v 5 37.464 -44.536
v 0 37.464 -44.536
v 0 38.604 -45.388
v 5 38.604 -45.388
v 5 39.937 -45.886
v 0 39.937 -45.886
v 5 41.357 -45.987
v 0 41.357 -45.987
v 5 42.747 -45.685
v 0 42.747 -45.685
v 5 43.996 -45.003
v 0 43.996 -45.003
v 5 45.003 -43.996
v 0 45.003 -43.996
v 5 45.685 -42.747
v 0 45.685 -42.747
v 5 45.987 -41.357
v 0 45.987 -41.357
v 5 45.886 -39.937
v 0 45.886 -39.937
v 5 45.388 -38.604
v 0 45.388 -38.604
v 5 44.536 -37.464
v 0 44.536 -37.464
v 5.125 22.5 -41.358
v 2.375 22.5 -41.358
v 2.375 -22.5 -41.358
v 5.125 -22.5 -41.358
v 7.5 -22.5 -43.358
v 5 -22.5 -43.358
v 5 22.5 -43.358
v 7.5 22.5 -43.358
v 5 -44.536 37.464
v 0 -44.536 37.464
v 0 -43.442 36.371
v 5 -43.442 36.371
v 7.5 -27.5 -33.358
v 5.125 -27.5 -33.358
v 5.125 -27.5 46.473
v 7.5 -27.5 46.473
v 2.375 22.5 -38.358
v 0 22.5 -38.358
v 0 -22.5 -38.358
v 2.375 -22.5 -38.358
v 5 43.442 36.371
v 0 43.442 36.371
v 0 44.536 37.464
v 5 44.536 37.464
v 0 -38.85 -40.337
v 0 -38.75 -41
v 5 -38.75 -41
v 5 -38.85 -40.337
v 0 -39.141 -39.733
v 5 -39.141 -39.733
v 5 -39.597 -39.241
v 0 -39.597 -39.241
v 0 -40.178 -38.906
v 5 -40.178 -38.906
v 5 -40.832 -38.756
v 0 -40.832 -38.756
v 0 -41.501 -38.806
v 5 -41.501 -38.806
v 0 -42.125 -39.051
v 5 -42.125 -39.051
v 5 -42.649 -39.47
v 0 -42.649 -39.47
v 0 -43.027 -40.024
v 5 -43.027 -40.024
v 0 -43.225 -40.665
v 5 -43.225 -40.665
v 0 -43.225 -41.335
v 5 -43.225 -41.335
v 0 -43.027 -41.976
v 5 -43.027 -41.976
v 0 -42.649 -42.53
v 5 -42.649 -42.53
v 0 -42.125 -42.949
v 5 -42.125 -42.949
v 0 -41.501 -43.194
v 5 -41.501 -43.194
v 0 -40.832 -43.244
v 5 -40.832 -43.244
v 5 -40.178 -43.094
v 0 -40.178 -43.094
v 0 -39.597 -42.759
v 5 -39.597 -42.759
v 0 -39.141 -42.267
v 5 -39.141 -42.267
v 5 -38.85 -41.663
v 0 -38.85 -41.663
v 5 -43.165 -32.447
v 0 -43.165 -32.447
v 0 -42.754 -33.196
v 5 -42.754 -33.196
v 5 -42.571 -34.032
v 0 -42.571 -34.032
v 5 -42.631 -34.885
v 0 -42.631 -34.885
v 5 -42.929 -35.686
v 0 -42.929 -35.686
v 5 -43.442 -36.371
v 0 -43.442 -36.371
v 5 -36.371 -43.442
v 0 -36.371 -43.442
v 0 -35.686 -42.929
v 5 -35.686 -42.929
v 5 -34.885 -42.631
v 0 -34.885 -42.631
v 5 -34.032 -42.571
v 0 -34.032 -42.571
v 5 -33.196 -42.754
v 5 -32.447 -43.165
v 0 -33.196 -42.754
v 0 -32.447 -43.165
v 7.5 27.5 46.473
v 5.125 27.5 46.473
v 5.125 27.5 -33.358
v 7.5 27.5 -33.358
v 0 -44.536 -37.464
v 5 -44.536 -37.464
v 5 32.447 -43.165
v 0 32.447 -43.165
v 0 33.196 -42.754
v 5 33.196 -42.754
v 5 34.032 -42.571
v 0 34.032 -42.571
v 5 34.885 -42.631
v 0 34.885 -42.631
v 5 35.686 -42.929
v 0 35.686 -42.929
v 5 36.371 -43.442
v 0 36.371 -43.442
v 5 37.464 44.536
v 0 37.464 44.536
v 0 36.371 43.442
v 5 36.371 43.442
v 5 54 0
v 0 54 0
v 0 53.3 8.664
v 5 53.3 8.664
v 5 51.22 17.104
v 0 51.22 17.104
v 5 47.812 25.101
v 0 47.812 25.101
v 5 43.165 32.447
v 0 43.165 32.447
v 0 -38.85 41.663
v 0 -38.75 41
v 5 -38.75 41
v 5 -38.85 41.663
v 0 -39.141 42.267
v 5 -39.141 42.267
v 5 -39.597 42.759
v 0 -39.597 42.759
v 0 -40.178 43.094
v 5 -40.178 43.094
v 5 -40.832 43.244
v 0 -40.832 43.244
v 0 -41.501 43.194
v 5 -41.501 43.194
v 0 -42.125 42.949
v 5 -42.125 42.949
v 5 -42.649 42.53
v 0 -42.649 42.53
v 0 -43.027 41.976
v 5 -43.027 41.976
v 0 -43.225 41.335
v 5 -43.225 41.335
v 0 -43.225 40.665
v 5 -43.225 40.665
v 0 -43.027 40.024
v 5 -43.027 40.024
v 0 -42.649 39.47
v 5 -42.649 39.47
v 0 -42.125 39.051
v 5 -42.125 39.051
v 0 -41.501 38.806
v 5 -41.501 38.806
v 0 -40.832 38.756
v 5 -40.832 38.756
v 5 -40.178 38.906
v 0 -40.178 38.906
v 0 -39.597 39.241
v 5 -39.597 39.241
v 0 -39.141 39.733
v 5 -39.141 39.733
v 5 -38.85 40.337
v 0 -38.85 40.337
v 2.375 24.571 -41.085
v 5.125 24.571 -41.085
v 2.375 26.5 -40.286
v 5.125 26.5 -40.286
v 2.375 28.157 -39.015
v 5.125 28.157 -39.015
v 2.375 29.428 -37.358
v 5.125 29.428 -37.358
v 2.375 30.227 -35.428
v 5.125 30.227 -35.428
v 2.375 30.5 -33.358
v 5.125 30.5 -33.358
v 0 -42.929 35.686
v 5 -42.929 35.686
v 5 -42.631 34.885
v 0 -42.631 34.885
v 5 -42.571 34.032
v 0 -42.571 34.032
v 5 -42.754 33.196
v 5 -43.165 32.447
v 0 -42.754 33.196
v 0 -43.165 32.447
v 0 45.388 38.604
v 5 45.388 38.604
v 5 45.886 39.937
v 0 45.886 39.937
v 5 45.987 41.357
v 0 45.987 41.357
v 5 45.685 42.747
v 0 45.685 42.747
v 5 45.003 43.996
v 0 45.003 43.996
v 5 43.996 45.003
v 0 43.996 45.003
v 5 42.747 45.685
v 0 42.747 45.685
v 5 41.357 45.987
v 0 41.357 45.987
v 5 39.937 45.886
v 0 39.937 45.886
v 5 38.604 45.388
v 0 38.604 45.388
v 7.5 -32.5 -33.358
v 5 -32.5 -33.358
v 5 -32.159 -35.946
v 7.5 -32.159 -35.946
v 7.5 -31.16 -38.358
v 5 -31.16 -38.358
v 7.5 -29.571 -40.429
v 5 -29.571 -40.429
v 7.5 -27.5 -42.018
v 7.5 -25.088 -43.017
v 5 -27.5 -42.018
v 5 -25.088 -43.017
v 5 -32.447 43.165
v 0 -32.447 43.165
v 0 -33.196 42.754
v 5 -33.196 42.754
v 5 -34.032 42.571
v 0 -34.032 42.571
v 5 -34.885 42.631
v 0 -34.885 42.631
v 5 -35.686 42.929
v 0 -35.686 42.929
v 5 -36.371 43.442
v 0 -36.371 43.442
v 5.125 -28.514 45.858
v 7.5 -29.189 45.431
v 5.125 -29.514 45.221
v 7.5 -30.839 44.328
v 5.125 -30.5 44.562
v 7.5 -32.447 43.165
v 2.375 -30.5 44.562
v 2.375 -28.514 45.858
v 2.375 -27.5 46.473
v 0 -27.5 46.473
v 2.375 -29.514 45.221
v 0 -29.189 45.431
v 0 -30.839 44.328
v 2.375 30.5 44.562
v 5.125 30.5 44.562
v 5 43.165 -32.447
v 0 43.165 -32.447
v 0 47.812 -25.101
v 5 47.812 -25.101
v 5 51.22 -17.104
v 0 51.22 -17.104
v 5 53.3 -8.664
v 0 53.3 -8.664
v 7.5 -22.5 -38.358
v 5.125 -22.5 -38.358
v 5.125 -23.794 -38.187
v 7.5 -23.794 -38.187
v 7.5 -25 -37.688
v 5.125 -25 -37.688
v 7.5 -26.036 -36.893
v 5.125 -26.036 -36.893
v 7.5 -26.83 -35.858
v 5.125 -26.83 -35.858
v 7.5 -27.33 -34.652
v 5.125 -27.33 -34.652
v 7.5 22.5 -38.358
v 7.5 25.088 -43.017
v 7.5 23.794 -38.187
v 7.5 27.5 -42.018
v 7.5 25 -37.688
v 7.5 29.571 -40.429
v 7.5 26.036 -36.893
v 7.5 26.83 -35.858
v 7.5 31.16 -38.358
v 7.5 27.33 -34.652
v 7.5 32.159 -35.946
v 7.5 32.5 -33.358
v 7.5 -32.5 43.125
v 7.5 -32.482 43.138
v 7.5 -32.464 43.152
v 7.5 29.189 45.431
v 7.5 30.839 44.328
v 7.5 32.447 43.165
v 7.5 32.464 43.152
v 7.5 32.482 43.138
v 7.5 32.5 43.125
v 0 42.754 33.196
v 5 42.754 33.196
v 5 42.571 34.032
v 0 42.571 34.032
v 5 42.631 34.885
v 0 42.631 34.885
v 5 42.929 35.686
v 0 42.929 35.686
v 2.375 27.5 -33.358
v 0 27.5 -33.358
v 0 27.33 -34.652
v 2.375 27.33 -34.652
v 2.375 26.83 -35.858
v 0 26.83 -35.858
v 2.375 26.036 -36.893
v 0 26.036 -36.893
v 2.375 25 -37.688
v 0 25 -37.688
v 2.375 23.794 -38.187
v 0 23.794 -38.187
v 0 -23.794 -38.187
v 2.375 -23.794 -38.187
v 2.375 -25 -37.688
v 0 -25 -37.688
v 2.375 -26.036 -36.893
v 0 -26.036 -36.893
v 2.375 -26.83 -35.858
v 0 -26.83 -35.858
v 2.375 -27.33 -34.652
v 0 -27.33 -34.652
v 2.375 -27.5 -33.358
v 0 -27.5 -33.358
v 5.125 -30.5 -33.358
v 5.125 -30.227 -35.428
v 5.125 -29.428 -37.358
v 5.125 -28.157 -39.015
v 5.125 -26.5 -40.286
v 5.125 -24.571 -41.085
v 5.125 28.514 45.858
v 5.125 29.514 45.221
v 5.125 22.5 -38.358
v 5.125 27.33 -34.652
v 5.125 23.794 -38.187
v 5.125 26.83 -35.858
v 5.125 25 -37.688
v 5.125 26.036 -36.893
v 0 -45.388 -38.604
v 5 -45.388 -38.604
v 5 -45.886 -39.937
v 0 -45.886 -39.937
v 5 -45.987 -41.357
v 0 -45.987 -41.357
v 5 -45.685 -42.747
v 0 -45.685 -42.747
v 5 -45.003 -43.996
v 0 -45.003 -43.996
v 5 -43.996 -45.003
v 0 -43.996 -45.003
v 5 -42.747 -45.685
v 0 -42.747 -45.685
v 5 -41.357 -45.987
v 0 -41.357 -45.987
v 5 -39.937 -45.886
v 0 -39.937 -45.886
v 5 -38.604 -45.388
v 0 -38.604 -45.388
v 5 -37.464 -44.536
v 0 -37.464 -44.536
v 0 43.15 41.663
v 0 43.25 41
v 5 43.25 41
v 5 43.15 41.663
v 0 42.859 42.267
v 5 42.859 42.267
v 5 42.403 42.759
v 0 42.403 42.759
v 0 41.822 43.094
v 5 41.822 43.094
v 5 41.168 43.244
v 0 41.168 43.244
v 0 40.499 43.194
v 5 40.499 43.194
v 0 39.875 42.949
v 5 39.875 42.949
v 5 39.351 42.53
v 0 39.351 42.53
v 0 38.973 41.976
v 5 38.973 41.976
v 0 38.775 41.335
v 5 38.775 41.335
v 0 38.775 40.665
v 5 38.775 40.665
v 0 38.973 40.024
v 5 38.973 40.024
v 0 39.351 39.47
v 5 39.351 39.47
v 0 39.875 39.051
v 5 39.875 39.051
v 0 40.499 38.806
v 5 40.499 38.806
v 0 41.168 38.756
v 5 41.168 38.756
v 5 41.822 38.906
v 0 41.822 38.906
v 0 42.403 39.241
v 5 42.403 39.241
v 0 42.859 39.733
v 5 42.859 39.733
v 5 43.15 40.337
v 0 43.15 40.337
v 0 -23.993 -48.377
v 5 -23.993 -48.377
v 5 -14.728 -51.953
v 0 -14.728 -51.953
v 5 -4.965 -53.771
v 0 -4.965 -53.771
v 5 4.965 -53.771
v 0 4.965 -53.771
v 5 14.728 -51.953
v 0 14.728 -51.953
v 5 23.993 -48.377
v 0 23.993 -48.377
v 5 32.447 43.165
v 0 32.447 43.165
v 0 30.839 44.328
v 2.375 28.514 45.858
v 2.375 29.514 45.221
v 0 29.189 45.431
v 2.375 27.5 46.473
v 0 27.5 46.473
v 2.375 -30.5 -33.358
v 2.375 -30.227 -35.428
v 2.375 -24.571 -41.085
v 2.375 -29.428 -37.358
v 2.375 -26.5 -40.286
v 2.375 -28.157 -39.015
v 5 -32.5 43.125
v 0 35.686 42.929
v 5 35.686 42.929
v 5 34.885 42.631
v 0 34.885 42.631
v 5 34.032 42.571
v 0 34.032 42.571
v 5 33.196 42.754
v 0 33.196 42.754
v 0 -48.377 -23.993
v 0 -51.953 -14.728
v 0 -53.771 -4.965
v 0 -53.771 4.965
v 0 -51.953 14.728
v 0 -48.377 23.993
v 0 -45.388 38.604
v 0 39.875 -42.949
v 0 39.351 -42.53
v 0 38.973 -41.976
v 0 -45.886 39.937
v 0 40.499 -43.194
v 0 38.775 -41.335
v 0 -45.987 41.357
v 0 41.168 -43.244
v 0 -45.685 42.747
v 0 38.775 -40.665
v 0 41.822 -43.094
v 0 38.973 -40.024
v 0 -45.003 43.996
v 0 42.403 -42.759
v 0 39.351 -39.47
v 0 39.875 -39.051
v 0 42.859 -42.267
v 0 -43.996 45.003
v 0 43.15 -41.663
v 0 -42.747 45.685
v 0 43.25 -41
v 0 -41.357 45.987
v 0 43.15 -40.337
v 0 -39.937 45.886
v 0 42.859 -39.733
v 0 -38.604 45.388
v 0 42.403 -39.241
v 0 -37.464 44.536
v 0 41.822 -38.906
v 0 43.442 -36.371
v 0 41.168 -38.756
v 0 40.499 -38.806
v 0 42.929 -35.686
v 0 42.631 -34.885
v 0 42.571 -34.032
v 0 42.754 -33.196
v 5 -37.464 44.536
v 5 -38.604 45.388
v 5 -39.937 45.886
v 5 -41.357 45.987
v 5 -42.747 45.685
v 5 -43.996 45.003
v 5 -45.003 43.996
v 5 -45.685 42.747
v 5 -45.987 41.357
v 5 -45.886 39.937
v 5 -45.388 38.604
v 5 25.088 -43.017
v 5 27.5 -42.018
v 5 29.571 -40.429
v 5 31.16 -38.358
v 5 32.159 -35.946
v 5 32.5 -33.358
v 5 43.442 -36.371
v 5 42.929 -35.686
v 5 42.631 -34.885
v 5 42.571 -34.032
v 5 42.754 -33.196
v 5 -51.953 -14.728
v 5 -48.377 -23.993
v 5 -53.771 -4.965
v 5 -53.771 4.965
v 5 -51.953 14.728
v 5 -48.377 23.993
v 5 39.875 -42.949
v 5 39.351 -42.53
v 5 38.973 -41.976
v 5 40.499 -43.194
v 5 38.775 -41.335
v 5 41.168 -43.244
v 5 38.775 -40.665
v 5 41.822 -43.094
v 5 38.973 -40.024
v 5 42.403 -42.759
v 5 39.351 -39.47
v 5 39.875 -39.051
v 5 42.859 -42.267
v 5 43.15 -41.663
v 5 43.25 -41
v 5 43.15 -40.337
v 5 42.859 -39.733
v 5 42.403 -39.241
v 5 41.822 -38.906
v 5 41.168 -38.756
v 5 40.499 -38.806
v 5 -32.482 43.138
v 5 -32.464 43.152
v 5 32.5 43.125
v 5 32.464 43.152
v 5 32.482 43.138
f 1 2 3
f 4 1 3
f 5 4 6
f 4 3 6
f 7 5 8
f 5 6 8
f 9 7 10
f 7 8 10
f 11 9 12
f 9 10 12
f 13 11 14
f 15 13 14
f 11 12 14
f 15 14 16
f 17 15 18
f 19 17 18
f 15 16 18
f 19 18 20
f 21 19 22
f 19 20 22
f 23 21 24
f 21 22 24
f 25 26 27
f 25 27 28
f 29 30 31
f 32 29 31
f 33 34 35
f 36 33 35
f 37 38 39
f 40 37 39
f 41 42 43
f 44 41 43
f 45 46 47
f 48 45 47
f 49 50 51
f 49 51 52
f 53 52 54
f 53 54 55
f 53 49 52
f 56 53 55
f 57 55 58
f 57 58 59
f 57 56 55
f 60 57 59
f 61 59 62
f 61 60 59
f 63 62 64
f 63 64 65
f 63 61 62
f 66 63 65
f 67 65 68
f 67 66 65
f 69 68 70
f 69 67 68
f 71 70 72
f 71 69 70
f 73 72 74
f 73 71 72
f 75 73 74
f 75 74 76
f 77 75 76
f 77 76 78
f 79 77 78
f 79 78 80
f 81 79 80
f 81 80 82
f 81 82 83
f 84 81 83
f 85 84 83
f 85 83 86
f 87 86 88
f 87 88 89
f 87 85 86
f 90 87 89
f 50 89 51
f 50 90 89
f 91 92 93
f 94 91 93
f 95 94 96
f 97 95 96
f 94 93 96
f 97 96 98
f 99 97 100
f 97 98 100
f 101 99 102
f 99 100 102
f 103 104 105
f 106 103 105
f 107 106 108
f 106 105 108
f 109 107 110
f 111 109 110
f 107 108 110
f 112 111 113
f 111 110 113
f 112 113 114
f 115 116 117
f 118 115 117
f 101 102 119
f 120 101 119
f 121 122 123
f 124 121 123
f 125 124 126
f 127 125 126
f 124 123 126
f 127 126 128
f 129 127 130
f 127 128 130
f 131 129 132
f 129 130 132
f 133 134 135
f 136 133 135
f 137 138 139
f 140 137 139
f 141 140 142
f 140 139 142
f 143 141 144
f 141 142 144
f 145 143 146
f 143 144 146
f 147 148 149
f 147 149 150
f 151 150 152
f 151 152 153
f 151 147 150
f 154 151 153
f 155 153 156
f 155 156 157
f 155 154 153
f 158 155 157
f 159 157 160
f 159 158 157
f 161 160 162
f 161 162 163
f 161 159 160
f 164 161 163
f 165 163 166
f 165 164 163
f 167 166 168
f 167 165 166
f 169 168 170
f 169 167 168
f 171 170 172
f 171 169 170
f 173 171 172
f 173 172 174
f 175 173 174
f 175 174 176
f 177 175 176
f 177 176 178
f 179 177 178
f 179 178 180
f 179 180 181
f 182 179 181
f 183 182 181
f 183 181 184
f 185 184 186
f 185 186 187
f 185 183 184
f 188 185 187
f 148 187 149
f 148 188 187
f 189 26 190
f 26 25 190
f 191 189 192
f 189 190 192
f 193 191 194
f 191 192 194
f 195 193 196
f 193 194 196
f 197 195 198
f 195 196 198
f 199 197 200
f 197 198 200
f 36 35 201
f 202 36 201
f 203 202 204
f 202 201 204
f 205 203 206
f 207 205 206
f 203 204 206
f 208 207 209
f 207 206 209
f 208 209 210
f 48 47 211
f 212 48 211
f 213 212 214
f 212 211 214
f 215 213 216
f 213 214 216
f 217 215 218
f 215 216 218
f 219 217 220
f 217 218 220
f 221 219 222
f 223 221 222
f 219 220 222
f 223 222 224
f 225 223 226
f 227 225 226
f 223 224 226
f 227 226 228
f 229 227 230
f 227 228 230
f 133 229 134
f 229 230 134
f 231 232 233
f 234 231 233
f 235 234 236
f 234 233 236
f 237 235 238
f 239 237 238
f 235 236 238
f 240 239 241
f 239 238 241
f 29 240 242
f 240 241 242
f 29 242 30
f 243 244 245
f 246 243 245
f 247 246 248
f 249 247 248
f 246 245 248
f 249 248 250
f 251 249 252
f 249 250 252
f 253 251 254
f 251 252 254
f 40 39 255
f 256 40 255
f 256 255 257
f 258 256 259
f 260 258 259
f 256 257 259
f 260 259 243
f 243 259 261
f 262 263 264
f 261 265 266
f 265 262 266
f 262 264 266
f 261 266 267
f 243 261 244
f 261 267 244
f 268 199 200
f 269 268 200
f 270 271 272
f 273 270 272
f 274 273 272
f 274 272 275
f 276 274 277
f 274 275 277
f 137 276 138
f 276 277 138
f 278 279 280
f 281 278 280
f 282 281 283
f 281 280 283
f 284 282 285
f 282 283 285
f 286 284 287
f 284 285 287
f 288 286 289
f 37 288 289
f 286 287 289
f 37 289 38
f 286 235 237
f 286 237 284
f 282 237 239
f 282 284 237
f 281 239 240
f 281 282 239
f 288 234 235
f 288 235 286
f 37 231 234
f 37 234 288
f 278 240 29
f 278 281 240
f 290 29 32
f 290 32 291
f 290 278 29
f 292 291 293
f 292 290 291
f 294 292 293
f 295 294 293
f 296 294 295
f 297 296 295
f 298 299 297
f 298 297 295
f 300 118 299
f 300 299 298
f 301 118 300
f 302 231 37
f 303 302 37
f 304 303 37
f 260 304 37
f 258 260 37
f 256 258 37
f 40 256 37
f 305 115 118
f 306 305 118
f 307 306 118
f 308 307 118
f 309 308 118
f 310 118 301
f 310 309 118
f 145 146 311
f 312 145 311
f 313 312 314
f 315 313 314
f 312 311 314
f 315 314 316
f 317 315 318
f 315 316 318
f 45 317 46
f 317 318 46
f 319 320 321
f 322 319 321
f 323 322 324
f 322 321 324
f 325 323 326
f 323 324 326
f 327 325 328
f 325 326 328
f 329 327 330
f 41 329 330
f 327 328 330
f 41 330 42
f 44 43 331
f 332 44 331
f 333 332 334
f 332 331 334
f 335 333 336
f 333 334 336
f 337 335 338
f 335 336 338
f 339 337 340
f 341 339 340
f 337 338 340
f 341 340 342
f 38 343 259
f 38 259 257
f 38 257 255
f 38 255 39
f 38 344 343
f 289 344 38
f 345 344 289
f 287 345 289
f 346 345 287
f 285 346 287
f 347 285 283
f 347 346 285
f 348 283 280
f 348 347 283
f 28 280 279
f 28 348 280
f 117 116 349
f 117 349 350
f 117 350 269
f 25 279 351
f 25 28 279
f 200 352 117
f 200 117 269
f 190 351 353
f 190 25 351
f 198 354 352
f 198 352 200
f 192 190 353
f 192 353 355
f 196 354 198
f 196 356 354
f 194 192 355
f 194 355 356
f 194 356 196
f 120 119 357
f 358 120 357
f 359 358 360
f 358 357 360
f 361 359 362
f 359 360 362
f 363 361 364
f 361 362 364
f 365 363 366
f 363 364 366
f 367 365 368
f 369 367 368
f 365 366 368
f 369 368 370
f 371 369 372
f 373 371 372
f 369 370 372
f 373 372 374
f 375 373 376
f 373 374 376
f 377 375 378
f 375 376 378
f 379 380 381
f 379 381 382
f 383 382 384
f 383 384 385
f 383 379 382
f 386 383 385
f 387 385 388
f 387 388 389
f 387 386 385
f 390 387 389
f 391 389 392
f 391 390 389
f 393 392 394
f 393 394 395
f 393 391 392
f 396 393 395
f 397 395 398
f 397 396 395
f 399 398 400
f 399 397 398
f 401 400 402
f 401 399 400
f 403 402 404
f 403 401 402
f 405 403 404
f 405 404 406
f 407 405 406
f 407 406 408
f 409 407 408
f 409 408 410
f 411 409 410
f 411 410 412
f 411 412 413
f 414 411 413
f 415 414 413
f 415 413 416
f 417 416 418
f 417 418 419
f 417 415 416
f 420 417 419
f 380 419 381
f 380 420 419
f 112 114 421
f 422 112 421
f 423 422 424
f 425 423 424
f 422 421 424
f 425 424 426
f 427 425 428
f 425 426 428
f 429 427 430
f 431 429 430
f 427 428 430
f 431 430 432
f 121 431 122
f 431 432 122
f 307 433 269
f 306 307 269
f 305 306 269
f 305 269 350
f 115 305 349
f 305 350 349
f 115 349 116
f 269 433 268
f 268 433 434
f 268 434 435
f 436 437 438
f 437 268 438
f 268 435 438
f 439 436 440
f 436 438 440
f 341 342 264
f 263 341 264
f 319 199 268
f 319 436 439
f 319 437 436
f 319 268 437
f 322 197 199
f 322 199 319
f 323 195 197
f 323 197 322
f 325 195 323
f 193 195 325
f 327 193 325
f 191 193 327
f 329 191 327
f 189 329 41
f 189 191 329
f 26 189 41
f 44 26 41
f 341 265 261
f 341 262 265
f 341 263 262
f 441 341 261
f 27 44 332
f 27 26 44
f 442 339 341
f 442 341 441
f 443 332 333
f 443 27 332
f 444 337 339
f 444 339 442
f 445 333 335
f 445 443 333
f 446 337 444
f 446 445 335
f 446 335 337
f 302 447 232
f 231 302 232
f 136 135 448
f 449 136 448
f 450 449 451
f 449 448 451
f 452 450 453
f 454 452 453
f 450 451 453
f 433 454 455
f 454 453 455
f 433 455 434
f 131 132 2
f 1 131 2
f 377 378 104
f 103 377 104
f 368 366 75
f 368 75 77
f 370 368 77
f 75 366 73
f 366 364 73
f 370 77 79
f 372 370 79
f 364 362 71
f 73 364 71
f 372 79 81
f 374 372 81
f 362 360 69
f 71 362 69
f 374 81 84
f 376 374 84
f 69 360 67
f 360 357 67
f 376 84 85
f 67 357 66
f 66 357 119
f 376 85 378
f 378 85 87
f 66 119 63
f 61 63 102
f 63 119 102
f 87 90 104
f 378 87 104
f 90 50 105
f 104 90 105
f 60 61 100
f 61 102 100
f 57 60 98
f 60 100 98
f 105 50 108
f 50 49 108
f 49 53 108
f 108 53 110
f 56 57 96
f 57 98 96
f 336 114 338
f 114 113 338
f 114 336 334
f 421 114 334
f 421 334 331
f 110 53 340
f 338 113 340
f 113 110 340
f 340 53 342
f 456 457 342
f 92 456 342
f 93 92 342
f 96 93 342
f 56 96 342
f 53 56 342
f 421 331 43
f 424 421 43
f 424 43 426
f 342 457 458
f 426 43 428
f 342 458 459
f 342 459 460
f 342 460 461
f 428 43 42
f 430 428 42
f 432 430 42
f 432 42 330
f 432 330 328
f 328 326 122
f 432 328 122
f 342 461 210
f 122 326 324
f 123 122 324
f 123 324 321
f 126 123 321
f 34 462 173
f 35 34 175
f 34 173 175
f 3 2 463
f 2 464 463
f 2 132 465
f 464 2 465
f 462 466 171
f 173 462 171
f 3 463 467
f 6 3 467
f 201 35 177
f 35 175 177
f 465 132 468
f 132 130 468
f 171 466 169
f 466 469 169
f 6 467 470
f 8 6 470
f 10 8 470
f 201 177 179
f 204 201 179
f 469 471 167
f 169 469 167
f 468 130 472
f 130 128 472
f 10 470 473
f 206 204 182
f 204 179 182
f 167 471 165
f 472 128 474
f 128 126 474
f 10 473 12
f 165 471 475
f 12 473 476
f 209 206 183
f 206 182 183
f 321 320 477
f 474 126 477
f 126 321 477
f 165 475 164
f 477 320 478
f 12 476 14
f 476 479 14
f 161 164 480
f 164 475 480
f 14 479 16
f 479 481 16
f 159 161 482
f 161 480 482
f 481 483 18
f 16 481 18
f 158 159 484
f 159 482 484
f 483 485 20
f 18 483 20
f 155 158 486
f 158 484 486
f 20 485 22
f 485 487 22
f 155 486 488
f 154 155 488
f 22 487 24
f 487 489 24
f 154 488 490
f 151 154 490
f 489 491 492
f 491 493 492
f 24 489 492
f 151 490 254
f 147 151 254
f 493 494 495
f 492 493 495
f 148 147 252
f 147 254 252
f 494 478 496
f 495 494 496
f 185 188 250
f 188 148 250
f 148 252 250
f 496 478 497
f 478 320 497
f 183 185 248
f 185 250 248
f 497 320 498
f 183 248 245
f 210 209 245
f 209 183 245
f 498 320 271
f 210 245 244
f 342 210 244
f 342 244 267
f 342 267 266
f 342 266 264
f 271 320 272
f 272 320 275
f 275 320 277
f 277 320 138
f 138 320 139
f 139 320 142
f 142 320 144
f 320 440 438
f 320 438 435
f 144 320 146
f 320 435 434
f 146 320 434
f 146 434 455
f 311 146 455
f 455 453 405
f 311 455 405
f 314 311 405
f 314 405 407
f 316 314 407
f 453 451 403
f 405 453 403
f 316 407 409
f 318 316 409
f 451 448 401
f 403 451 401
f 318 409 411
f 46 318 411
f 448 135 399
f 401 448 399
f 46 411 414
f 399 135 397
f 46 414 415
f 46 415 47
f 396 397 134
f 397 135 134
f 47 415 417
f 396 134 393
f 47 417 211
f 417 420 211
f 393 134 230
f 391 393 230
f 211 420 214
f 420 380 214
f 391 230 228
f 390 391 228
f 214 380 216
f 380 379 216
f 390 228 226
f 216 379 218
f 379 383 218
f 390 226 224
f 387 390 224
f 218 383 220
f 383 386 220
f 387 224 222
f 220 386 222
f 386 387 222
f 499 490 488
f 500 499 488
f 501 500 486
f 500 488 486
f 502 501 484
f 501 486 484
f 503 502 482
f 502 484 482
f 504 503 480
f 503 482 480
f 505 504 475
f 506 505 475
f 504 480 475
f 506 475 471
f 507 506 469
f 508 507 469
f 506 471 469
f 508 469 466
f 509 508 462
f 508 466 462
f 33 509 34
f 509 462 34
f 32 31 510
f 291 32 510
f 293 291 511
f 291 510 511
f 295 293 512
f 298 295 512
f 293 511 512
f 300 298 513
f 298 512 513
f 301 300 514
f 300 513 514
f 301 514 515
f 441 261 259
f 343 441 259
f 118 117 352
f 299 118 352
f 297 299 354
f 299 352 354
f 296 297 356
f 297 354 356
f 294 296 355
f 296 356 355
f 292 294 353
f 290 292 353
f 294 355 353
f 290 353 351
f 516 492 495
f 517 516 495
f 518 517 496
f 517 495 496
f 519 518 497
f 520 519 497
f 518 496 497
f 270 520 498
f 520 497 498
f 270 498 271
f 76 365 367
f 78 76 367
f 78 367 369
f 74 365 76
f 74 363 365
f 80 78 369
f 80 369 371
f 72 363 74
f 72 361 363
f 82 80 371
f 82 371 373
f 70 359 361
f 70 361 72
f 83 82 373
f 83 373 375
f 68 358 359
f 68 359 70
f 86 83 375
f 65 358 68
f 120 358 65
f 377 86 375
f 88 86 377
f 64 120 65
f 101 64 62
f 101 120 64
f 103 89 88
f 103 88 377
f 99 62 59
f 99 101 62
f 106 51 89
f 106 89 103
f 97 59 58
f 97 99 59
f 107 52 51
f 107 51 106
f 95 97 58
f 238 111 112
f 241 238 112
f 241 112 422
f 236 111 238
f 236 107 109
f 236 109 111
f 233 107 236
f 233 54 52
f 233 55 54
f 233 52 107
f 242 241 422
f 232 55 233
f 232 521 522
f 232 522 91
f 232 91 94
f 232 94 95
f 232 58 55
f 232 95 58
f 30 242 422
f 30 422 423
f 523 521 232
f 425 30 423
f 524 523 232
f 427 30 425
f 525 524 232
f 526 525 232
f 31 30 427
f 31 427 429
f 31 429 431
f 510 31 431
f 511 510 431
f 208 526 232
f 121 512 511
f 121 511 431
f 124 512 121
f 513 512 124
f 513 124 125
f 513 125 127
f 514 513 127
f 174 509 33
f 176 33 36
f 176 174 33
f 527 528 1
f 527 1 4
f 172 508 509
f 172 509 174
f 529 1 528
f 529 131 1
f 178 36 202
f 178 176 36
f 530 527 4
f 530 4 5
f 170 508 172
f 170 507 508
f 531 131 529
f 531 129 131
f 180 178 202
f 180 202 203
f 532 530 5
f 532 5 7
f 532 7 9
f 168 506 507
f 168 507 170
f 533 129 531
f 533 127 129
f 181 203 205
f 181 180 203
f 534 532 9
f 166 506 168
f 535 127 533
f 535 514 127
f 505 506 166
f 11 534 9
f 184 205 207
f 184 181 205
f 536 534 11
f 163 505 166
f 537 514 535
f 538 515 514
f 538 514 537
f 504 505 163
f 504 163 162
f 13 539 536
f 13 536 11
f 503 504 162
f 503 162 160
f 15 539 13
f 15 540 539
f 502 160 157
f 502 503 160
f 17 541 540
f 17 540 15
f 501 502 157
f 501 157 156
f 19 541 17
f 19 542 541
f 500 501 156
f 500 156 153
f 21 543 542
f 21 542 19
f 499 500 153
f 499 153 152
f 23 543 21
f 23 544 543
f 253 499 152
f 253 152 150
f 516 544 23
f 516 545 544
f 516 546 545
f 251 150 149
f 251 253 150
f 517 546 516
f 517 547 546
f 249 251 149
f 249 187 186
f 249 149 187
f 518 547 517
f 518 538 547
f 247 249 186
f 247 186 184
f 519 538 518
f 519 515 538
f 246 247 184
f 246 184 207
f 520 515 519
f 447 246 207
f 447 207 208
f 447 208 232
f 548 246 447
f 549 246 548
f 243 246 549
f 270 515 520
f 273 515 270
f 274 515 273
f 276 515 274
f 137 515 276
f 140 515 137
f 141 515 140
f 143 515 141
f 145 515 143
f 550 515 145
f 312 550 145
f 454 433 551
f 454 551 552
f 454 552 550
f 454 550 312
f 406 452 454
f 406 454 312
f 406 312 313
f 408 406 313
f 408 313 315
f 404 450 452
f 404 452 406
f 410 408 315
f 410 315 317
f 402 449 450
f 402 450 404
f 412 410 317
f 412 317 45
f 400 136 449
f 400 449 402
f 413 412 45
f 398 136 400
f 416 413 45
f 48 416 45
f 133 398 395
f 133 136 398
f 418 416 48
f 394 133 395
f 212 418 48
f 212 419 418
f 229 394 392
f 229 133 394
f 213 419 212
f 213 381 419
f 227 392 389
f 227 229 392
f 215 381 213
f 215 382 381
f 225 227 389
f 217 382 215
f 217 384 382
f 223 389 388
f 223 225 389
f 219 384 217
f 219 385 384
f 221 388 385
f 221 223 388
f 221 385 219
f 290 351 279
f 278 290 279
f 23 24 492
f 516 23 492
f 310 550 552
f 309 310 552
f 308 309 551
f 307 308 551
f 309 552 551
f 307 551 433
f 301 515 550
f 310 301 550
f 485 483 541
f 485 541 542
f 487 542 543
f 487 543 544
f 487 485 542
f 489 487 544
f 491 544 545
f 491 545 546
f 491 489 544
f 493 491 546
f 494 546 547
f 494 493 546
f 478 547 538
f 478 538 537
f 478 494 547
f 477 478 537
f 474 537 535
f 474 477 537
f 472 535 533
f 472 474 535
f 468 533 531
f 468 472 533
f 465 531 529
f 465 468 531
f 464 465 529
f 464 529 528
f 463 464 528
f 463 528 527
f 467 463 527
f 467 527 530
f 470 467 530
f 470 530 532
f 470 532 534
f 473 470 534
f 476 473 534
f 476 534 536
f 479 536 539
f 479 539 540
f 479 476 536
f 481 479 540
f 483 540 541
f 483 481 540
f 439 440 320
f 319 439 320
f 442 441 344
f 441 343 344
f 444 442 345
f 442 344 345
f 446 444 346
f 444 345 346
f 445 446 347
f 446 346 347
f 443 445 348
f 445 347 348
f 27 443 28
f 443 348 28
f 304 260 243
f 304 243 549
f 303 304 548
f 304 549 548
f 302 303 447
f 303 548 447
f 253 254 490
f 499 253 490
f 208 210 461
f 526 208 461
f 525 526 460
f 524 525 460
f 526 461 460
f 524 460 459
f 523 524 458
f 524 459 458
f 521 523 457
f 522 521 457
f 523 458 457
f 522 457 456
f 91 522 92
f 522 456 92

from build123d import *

# Parameters (mm, degrees)
F0_R     = 2.25
F1_DEPTH = 5
F2_DEPTH = 7.5
F4_W     = 2.75
F4_H     = 5


with BuildPart() as f1:
    # F0 (on Right) → F1 (new body)
    with BuildSketch(Plane.YZ):
        with BuildLine():
            Line((-32.5, -33.3578620553), (-32.5, 43.1248188402))
            ThreePointArc((-32.5, 43.1248188402), (-38.2073481766, 38.1601696185), (-43.1649418054, 32.4466916485))
            ThreePointArc((-43.1649418054, 32.4466916485), (-54, 0), (-43.1649418054, -32.4466916485))
            ThreePointArc((-43.1649418054, -32.4466916485), (-38.1837661841, -38.1837661841), (-32.4466916485, -43.1649418054))
            ThreePointArc((-32.4466916485, -43.1649418054), (0, -54), (32.4466916485, -43.1649418054))
            ThreePointArc((32.4466916485, -43.1649418054), (38.1837661841, -38.1837661841), (43.1649418054, -32.4466916485))
            ThreePointArc((43.1649418054, -32.4466916485), (51.2196586161, -17.1039928453), (54, 0))
            ThreePointArc((54, 0), (51.2196586161, 17.1039928453), (43.1649418054, 32.4466916485))
            ThreePointArc((43.1649418054, 32.4466916485), (38.2073481766, 38.1601696185), (32.5, 43.1248188402))
            Line((32.5, 43.1248188402), (32.5, -33.3578620553))
            ThreePointArc((32.5, -33.3578620553), (29.5710678119, -40.4289298672), (22.5, -43.3578620553))
            Line((22.5, -43.3578620553), (-22.5, -43.3578620553))
            ThreePointArc((-22.5, -43.3578620553), (-29.5710678119, -40.4289298672), (-32.5, -33.3578620553))
        make_face()
        with BuildLine():
            ThreePointArc((-32.5, 43.1248188402), (-32.4733520211, 43.1448885561), (-32.4466916485, 43.1649418054))
            ThreePointArc((-32.4466916485, 43.1649418054), (-34.4603348429, 42.5704269643), (-36.3706059725, 43.4416737844))
            Line((-36.3706059725, 43.4416737844), (-37.4644660941, 44.5355339059))
            ThreePointArc((-37.4644660941, 44.5355339059), (-44.5355339059, 44.5355339059), (-44.5355339059, 37.4644660941))
            Line((-44.5355339059, 37.4644660941), (-43.4416737844, 36.3706059725))
            ThreePointArc((-43.4416737844, 36.3706059725), (-42.5704269643, 34.4603348429), (-43.1649418054, 32.4466916485))
            ThreePointArc((-43.1649418054, 32.4466916485), (-38.2073481766, 38.1601696185), (-32.5, 43.1248188402))
        make_face()
        with Locations((-41, 41)):
            Circle(F0_R, mode=Mode.SUBTRACT)
        with BuildLine():
            ThreePointArc((32.4466916485, 43.1649418054), (32.4733520211, 43.1448885561), (32.5, 43.1248188402))
            ThreePointArc((32.5, 43.1248188402), (38.2073481766, 38.1601696185), (43.1649418054, 32.4466916485))
            ThreePointArc((43.1649418054, 32.4466916485), (42.5704269643, 34.4603348429), (43.4416737844, 36.3706059725))
            Line((43.4416737844, 36.3706059725), (44.5355339059, 37.4644660941))
            ThreePointArc((44.5355339059, 37.4644660941), (44.5355339059, 44.5355339059), (37.4644660941, 44.5355339059))
            Line((37.4644660941, 44.5355339059), (36.3706059725, 43.4416737844))
            ThreePointArc((36.3706059725, 43.4416737844), (34.4603348429, 42.5704269643), (32.4466916485, 43.1649418054))
        make_face()
        with Locations((41, 41)):
            Circle(F0_R, mode=Mode.SUBTRACT)
        with BuildLine():
            ThreePointArc((43.1649418054, -32.4466916485), (38.1837661841, -38.1837661841), (32.4466916485, -43.1649418054))
            ThreePointArc((32.4466916485, -43.1649418054), (34.4603348429, -42.5704269643), (36.3706059725, -43.4416737844))
            Line((36.3706059725, -43.4416737844), (37.4644660941, -44.5355339059))
            ThreePointArc((37.4644660941, -44.5355339059), (44.5355339059, -44.5355339059), (44.5355339059, -37.4644660941))
            Line((44.5355339059, -37.4644660941), (43.4416737844, -36.3706059725))
            ThreePointArc((43.4416737844, -36.3706059725), (42.5704269643, -34.4603348429), (43.1649418054, -32.4466916485))
        make_face()
        with Locations((41, -41)):
            Circle(F0_R, mode=Mode.SUBTRACT)
        with BuildLine():
            ThreePointArc((-32.4466916485, -43.1649418054), (-38.1837661841, -38.1837661841), (-43.1649418054, -32.4466916485))
            ThreePointArc((-43.1649418054, -32.4466916485), (-42.5704269643, -34.4603348429), (-43.4416737844, -36.3706059725))
            Line((-43.4416737844, -36.3706059725), (-44.5355339059, -37.4644660941))
            ThreePointArc((-44.5355339059, -37.4644660941), (-44.5355339059, -44.5355339059), (-37.4644660941, -44.5355339059))
            Line((-37.4644660941, -44.5355339059), (-36.3706059725, -43.4416737844))
            ThreePointArc((-36.3706059725, -43.4416737844), (-34.4603348429, -42.5704269643), (-32.4466916485, -43.1649418054))
        make_face()
        with Locations((-41, -41)):
            Circle(F0_R, mode=Mode.SUBTRACT)
    extrude(amount=F1_DEPTH)

    # F0 (on Right) → F2 (join)
    with BuildSketch(Plane.YZ):
        with BuildLine():
            ThreePointArc((-27.5, 46.4731105049), (-30.0189515962, 44.8872202867), (-32.4466916485, 43.1649418054))
            ThreePointArc((-32.4466916485, 43.1649418054), (-32.4733520211, 43.1448885561), (-32.5, 43.1248188402))
            Line((-32.5, 43.1248188402), (-32.5, -33.3578620553))
            ThreePointArc((-32.5, -33.3578620553), (-29.5710678119, -40.4289298672), (-22.5, -43.3578620553))
            Line((-22.5, -43.3578620553), (22.5, -43.3578620553))
            ThreePointArc((22.5, -43.3578620553), (29.5710678119, -40.4289298672), (32.5, -33.3578620553))
            Line((32.5, -33.3578620553), (32.5, 43.1248188402))
            ThreePointArc((32.5, 43.1248188402), (32.4733520211, 43.1448885561), (32.4466916485, 43.1649418054))
            ThreePointArc((32.4466916485, 43.1649418054), (30.0189515962, 44.8872202867), (27.5, 46.4731105049))
            Line((27.5, 46.4731105049), (27.5, -33.3578620553))
            ThreePointArc((27.5, -33.3578620553), (26.0355339059, -36.8933959612), (22.5, -38.3578620553))
            Line((22.5, -38.3578620553), (-22.5, -38.3578620553))
            ThreePointArc((-22.5, -38.3578620553), (-26.0355339059, -36.8933959612), (-27.5, -33.3578620553))
            Line((-27.5, -33.3578620553), (-27.5, 46.4731105049))
        make_face()
    extrude(amount=F2_DEPTH)

    # F5: sweep along a path in F0
    with BuildLine(Plane.YZ) as f5_path:
        Line((-27.5, 46.4731105049), (-27.5, -33.3578620553))
        ThreePointArc((-27.5, -33.3578620553), (-26.0355339059, -36.8933959612), (-22.5, -38.3578620553))
        Line((-22.5, -38.3578620553), (22.5, -38.3578620553))
        ThreePointArc((22.5, -38.3578620553), (26.0355339059, -36.8933959612), (27.5, -33.3578620553))
        Line((27.5, -33.3578620553), (27.5, 46.4731105049))
    # F4 (on plane+point) → F5 (sweep, cut)
    with BuildSketch(Plane.XY.offset(46.4731105049)):
        with Locations((3.75, -28)):
            Rectangle(F4_W, F4_H)
    sweep(path=f5_path.line, mode=Mode.SUBTRACT)


solid = f1.part
